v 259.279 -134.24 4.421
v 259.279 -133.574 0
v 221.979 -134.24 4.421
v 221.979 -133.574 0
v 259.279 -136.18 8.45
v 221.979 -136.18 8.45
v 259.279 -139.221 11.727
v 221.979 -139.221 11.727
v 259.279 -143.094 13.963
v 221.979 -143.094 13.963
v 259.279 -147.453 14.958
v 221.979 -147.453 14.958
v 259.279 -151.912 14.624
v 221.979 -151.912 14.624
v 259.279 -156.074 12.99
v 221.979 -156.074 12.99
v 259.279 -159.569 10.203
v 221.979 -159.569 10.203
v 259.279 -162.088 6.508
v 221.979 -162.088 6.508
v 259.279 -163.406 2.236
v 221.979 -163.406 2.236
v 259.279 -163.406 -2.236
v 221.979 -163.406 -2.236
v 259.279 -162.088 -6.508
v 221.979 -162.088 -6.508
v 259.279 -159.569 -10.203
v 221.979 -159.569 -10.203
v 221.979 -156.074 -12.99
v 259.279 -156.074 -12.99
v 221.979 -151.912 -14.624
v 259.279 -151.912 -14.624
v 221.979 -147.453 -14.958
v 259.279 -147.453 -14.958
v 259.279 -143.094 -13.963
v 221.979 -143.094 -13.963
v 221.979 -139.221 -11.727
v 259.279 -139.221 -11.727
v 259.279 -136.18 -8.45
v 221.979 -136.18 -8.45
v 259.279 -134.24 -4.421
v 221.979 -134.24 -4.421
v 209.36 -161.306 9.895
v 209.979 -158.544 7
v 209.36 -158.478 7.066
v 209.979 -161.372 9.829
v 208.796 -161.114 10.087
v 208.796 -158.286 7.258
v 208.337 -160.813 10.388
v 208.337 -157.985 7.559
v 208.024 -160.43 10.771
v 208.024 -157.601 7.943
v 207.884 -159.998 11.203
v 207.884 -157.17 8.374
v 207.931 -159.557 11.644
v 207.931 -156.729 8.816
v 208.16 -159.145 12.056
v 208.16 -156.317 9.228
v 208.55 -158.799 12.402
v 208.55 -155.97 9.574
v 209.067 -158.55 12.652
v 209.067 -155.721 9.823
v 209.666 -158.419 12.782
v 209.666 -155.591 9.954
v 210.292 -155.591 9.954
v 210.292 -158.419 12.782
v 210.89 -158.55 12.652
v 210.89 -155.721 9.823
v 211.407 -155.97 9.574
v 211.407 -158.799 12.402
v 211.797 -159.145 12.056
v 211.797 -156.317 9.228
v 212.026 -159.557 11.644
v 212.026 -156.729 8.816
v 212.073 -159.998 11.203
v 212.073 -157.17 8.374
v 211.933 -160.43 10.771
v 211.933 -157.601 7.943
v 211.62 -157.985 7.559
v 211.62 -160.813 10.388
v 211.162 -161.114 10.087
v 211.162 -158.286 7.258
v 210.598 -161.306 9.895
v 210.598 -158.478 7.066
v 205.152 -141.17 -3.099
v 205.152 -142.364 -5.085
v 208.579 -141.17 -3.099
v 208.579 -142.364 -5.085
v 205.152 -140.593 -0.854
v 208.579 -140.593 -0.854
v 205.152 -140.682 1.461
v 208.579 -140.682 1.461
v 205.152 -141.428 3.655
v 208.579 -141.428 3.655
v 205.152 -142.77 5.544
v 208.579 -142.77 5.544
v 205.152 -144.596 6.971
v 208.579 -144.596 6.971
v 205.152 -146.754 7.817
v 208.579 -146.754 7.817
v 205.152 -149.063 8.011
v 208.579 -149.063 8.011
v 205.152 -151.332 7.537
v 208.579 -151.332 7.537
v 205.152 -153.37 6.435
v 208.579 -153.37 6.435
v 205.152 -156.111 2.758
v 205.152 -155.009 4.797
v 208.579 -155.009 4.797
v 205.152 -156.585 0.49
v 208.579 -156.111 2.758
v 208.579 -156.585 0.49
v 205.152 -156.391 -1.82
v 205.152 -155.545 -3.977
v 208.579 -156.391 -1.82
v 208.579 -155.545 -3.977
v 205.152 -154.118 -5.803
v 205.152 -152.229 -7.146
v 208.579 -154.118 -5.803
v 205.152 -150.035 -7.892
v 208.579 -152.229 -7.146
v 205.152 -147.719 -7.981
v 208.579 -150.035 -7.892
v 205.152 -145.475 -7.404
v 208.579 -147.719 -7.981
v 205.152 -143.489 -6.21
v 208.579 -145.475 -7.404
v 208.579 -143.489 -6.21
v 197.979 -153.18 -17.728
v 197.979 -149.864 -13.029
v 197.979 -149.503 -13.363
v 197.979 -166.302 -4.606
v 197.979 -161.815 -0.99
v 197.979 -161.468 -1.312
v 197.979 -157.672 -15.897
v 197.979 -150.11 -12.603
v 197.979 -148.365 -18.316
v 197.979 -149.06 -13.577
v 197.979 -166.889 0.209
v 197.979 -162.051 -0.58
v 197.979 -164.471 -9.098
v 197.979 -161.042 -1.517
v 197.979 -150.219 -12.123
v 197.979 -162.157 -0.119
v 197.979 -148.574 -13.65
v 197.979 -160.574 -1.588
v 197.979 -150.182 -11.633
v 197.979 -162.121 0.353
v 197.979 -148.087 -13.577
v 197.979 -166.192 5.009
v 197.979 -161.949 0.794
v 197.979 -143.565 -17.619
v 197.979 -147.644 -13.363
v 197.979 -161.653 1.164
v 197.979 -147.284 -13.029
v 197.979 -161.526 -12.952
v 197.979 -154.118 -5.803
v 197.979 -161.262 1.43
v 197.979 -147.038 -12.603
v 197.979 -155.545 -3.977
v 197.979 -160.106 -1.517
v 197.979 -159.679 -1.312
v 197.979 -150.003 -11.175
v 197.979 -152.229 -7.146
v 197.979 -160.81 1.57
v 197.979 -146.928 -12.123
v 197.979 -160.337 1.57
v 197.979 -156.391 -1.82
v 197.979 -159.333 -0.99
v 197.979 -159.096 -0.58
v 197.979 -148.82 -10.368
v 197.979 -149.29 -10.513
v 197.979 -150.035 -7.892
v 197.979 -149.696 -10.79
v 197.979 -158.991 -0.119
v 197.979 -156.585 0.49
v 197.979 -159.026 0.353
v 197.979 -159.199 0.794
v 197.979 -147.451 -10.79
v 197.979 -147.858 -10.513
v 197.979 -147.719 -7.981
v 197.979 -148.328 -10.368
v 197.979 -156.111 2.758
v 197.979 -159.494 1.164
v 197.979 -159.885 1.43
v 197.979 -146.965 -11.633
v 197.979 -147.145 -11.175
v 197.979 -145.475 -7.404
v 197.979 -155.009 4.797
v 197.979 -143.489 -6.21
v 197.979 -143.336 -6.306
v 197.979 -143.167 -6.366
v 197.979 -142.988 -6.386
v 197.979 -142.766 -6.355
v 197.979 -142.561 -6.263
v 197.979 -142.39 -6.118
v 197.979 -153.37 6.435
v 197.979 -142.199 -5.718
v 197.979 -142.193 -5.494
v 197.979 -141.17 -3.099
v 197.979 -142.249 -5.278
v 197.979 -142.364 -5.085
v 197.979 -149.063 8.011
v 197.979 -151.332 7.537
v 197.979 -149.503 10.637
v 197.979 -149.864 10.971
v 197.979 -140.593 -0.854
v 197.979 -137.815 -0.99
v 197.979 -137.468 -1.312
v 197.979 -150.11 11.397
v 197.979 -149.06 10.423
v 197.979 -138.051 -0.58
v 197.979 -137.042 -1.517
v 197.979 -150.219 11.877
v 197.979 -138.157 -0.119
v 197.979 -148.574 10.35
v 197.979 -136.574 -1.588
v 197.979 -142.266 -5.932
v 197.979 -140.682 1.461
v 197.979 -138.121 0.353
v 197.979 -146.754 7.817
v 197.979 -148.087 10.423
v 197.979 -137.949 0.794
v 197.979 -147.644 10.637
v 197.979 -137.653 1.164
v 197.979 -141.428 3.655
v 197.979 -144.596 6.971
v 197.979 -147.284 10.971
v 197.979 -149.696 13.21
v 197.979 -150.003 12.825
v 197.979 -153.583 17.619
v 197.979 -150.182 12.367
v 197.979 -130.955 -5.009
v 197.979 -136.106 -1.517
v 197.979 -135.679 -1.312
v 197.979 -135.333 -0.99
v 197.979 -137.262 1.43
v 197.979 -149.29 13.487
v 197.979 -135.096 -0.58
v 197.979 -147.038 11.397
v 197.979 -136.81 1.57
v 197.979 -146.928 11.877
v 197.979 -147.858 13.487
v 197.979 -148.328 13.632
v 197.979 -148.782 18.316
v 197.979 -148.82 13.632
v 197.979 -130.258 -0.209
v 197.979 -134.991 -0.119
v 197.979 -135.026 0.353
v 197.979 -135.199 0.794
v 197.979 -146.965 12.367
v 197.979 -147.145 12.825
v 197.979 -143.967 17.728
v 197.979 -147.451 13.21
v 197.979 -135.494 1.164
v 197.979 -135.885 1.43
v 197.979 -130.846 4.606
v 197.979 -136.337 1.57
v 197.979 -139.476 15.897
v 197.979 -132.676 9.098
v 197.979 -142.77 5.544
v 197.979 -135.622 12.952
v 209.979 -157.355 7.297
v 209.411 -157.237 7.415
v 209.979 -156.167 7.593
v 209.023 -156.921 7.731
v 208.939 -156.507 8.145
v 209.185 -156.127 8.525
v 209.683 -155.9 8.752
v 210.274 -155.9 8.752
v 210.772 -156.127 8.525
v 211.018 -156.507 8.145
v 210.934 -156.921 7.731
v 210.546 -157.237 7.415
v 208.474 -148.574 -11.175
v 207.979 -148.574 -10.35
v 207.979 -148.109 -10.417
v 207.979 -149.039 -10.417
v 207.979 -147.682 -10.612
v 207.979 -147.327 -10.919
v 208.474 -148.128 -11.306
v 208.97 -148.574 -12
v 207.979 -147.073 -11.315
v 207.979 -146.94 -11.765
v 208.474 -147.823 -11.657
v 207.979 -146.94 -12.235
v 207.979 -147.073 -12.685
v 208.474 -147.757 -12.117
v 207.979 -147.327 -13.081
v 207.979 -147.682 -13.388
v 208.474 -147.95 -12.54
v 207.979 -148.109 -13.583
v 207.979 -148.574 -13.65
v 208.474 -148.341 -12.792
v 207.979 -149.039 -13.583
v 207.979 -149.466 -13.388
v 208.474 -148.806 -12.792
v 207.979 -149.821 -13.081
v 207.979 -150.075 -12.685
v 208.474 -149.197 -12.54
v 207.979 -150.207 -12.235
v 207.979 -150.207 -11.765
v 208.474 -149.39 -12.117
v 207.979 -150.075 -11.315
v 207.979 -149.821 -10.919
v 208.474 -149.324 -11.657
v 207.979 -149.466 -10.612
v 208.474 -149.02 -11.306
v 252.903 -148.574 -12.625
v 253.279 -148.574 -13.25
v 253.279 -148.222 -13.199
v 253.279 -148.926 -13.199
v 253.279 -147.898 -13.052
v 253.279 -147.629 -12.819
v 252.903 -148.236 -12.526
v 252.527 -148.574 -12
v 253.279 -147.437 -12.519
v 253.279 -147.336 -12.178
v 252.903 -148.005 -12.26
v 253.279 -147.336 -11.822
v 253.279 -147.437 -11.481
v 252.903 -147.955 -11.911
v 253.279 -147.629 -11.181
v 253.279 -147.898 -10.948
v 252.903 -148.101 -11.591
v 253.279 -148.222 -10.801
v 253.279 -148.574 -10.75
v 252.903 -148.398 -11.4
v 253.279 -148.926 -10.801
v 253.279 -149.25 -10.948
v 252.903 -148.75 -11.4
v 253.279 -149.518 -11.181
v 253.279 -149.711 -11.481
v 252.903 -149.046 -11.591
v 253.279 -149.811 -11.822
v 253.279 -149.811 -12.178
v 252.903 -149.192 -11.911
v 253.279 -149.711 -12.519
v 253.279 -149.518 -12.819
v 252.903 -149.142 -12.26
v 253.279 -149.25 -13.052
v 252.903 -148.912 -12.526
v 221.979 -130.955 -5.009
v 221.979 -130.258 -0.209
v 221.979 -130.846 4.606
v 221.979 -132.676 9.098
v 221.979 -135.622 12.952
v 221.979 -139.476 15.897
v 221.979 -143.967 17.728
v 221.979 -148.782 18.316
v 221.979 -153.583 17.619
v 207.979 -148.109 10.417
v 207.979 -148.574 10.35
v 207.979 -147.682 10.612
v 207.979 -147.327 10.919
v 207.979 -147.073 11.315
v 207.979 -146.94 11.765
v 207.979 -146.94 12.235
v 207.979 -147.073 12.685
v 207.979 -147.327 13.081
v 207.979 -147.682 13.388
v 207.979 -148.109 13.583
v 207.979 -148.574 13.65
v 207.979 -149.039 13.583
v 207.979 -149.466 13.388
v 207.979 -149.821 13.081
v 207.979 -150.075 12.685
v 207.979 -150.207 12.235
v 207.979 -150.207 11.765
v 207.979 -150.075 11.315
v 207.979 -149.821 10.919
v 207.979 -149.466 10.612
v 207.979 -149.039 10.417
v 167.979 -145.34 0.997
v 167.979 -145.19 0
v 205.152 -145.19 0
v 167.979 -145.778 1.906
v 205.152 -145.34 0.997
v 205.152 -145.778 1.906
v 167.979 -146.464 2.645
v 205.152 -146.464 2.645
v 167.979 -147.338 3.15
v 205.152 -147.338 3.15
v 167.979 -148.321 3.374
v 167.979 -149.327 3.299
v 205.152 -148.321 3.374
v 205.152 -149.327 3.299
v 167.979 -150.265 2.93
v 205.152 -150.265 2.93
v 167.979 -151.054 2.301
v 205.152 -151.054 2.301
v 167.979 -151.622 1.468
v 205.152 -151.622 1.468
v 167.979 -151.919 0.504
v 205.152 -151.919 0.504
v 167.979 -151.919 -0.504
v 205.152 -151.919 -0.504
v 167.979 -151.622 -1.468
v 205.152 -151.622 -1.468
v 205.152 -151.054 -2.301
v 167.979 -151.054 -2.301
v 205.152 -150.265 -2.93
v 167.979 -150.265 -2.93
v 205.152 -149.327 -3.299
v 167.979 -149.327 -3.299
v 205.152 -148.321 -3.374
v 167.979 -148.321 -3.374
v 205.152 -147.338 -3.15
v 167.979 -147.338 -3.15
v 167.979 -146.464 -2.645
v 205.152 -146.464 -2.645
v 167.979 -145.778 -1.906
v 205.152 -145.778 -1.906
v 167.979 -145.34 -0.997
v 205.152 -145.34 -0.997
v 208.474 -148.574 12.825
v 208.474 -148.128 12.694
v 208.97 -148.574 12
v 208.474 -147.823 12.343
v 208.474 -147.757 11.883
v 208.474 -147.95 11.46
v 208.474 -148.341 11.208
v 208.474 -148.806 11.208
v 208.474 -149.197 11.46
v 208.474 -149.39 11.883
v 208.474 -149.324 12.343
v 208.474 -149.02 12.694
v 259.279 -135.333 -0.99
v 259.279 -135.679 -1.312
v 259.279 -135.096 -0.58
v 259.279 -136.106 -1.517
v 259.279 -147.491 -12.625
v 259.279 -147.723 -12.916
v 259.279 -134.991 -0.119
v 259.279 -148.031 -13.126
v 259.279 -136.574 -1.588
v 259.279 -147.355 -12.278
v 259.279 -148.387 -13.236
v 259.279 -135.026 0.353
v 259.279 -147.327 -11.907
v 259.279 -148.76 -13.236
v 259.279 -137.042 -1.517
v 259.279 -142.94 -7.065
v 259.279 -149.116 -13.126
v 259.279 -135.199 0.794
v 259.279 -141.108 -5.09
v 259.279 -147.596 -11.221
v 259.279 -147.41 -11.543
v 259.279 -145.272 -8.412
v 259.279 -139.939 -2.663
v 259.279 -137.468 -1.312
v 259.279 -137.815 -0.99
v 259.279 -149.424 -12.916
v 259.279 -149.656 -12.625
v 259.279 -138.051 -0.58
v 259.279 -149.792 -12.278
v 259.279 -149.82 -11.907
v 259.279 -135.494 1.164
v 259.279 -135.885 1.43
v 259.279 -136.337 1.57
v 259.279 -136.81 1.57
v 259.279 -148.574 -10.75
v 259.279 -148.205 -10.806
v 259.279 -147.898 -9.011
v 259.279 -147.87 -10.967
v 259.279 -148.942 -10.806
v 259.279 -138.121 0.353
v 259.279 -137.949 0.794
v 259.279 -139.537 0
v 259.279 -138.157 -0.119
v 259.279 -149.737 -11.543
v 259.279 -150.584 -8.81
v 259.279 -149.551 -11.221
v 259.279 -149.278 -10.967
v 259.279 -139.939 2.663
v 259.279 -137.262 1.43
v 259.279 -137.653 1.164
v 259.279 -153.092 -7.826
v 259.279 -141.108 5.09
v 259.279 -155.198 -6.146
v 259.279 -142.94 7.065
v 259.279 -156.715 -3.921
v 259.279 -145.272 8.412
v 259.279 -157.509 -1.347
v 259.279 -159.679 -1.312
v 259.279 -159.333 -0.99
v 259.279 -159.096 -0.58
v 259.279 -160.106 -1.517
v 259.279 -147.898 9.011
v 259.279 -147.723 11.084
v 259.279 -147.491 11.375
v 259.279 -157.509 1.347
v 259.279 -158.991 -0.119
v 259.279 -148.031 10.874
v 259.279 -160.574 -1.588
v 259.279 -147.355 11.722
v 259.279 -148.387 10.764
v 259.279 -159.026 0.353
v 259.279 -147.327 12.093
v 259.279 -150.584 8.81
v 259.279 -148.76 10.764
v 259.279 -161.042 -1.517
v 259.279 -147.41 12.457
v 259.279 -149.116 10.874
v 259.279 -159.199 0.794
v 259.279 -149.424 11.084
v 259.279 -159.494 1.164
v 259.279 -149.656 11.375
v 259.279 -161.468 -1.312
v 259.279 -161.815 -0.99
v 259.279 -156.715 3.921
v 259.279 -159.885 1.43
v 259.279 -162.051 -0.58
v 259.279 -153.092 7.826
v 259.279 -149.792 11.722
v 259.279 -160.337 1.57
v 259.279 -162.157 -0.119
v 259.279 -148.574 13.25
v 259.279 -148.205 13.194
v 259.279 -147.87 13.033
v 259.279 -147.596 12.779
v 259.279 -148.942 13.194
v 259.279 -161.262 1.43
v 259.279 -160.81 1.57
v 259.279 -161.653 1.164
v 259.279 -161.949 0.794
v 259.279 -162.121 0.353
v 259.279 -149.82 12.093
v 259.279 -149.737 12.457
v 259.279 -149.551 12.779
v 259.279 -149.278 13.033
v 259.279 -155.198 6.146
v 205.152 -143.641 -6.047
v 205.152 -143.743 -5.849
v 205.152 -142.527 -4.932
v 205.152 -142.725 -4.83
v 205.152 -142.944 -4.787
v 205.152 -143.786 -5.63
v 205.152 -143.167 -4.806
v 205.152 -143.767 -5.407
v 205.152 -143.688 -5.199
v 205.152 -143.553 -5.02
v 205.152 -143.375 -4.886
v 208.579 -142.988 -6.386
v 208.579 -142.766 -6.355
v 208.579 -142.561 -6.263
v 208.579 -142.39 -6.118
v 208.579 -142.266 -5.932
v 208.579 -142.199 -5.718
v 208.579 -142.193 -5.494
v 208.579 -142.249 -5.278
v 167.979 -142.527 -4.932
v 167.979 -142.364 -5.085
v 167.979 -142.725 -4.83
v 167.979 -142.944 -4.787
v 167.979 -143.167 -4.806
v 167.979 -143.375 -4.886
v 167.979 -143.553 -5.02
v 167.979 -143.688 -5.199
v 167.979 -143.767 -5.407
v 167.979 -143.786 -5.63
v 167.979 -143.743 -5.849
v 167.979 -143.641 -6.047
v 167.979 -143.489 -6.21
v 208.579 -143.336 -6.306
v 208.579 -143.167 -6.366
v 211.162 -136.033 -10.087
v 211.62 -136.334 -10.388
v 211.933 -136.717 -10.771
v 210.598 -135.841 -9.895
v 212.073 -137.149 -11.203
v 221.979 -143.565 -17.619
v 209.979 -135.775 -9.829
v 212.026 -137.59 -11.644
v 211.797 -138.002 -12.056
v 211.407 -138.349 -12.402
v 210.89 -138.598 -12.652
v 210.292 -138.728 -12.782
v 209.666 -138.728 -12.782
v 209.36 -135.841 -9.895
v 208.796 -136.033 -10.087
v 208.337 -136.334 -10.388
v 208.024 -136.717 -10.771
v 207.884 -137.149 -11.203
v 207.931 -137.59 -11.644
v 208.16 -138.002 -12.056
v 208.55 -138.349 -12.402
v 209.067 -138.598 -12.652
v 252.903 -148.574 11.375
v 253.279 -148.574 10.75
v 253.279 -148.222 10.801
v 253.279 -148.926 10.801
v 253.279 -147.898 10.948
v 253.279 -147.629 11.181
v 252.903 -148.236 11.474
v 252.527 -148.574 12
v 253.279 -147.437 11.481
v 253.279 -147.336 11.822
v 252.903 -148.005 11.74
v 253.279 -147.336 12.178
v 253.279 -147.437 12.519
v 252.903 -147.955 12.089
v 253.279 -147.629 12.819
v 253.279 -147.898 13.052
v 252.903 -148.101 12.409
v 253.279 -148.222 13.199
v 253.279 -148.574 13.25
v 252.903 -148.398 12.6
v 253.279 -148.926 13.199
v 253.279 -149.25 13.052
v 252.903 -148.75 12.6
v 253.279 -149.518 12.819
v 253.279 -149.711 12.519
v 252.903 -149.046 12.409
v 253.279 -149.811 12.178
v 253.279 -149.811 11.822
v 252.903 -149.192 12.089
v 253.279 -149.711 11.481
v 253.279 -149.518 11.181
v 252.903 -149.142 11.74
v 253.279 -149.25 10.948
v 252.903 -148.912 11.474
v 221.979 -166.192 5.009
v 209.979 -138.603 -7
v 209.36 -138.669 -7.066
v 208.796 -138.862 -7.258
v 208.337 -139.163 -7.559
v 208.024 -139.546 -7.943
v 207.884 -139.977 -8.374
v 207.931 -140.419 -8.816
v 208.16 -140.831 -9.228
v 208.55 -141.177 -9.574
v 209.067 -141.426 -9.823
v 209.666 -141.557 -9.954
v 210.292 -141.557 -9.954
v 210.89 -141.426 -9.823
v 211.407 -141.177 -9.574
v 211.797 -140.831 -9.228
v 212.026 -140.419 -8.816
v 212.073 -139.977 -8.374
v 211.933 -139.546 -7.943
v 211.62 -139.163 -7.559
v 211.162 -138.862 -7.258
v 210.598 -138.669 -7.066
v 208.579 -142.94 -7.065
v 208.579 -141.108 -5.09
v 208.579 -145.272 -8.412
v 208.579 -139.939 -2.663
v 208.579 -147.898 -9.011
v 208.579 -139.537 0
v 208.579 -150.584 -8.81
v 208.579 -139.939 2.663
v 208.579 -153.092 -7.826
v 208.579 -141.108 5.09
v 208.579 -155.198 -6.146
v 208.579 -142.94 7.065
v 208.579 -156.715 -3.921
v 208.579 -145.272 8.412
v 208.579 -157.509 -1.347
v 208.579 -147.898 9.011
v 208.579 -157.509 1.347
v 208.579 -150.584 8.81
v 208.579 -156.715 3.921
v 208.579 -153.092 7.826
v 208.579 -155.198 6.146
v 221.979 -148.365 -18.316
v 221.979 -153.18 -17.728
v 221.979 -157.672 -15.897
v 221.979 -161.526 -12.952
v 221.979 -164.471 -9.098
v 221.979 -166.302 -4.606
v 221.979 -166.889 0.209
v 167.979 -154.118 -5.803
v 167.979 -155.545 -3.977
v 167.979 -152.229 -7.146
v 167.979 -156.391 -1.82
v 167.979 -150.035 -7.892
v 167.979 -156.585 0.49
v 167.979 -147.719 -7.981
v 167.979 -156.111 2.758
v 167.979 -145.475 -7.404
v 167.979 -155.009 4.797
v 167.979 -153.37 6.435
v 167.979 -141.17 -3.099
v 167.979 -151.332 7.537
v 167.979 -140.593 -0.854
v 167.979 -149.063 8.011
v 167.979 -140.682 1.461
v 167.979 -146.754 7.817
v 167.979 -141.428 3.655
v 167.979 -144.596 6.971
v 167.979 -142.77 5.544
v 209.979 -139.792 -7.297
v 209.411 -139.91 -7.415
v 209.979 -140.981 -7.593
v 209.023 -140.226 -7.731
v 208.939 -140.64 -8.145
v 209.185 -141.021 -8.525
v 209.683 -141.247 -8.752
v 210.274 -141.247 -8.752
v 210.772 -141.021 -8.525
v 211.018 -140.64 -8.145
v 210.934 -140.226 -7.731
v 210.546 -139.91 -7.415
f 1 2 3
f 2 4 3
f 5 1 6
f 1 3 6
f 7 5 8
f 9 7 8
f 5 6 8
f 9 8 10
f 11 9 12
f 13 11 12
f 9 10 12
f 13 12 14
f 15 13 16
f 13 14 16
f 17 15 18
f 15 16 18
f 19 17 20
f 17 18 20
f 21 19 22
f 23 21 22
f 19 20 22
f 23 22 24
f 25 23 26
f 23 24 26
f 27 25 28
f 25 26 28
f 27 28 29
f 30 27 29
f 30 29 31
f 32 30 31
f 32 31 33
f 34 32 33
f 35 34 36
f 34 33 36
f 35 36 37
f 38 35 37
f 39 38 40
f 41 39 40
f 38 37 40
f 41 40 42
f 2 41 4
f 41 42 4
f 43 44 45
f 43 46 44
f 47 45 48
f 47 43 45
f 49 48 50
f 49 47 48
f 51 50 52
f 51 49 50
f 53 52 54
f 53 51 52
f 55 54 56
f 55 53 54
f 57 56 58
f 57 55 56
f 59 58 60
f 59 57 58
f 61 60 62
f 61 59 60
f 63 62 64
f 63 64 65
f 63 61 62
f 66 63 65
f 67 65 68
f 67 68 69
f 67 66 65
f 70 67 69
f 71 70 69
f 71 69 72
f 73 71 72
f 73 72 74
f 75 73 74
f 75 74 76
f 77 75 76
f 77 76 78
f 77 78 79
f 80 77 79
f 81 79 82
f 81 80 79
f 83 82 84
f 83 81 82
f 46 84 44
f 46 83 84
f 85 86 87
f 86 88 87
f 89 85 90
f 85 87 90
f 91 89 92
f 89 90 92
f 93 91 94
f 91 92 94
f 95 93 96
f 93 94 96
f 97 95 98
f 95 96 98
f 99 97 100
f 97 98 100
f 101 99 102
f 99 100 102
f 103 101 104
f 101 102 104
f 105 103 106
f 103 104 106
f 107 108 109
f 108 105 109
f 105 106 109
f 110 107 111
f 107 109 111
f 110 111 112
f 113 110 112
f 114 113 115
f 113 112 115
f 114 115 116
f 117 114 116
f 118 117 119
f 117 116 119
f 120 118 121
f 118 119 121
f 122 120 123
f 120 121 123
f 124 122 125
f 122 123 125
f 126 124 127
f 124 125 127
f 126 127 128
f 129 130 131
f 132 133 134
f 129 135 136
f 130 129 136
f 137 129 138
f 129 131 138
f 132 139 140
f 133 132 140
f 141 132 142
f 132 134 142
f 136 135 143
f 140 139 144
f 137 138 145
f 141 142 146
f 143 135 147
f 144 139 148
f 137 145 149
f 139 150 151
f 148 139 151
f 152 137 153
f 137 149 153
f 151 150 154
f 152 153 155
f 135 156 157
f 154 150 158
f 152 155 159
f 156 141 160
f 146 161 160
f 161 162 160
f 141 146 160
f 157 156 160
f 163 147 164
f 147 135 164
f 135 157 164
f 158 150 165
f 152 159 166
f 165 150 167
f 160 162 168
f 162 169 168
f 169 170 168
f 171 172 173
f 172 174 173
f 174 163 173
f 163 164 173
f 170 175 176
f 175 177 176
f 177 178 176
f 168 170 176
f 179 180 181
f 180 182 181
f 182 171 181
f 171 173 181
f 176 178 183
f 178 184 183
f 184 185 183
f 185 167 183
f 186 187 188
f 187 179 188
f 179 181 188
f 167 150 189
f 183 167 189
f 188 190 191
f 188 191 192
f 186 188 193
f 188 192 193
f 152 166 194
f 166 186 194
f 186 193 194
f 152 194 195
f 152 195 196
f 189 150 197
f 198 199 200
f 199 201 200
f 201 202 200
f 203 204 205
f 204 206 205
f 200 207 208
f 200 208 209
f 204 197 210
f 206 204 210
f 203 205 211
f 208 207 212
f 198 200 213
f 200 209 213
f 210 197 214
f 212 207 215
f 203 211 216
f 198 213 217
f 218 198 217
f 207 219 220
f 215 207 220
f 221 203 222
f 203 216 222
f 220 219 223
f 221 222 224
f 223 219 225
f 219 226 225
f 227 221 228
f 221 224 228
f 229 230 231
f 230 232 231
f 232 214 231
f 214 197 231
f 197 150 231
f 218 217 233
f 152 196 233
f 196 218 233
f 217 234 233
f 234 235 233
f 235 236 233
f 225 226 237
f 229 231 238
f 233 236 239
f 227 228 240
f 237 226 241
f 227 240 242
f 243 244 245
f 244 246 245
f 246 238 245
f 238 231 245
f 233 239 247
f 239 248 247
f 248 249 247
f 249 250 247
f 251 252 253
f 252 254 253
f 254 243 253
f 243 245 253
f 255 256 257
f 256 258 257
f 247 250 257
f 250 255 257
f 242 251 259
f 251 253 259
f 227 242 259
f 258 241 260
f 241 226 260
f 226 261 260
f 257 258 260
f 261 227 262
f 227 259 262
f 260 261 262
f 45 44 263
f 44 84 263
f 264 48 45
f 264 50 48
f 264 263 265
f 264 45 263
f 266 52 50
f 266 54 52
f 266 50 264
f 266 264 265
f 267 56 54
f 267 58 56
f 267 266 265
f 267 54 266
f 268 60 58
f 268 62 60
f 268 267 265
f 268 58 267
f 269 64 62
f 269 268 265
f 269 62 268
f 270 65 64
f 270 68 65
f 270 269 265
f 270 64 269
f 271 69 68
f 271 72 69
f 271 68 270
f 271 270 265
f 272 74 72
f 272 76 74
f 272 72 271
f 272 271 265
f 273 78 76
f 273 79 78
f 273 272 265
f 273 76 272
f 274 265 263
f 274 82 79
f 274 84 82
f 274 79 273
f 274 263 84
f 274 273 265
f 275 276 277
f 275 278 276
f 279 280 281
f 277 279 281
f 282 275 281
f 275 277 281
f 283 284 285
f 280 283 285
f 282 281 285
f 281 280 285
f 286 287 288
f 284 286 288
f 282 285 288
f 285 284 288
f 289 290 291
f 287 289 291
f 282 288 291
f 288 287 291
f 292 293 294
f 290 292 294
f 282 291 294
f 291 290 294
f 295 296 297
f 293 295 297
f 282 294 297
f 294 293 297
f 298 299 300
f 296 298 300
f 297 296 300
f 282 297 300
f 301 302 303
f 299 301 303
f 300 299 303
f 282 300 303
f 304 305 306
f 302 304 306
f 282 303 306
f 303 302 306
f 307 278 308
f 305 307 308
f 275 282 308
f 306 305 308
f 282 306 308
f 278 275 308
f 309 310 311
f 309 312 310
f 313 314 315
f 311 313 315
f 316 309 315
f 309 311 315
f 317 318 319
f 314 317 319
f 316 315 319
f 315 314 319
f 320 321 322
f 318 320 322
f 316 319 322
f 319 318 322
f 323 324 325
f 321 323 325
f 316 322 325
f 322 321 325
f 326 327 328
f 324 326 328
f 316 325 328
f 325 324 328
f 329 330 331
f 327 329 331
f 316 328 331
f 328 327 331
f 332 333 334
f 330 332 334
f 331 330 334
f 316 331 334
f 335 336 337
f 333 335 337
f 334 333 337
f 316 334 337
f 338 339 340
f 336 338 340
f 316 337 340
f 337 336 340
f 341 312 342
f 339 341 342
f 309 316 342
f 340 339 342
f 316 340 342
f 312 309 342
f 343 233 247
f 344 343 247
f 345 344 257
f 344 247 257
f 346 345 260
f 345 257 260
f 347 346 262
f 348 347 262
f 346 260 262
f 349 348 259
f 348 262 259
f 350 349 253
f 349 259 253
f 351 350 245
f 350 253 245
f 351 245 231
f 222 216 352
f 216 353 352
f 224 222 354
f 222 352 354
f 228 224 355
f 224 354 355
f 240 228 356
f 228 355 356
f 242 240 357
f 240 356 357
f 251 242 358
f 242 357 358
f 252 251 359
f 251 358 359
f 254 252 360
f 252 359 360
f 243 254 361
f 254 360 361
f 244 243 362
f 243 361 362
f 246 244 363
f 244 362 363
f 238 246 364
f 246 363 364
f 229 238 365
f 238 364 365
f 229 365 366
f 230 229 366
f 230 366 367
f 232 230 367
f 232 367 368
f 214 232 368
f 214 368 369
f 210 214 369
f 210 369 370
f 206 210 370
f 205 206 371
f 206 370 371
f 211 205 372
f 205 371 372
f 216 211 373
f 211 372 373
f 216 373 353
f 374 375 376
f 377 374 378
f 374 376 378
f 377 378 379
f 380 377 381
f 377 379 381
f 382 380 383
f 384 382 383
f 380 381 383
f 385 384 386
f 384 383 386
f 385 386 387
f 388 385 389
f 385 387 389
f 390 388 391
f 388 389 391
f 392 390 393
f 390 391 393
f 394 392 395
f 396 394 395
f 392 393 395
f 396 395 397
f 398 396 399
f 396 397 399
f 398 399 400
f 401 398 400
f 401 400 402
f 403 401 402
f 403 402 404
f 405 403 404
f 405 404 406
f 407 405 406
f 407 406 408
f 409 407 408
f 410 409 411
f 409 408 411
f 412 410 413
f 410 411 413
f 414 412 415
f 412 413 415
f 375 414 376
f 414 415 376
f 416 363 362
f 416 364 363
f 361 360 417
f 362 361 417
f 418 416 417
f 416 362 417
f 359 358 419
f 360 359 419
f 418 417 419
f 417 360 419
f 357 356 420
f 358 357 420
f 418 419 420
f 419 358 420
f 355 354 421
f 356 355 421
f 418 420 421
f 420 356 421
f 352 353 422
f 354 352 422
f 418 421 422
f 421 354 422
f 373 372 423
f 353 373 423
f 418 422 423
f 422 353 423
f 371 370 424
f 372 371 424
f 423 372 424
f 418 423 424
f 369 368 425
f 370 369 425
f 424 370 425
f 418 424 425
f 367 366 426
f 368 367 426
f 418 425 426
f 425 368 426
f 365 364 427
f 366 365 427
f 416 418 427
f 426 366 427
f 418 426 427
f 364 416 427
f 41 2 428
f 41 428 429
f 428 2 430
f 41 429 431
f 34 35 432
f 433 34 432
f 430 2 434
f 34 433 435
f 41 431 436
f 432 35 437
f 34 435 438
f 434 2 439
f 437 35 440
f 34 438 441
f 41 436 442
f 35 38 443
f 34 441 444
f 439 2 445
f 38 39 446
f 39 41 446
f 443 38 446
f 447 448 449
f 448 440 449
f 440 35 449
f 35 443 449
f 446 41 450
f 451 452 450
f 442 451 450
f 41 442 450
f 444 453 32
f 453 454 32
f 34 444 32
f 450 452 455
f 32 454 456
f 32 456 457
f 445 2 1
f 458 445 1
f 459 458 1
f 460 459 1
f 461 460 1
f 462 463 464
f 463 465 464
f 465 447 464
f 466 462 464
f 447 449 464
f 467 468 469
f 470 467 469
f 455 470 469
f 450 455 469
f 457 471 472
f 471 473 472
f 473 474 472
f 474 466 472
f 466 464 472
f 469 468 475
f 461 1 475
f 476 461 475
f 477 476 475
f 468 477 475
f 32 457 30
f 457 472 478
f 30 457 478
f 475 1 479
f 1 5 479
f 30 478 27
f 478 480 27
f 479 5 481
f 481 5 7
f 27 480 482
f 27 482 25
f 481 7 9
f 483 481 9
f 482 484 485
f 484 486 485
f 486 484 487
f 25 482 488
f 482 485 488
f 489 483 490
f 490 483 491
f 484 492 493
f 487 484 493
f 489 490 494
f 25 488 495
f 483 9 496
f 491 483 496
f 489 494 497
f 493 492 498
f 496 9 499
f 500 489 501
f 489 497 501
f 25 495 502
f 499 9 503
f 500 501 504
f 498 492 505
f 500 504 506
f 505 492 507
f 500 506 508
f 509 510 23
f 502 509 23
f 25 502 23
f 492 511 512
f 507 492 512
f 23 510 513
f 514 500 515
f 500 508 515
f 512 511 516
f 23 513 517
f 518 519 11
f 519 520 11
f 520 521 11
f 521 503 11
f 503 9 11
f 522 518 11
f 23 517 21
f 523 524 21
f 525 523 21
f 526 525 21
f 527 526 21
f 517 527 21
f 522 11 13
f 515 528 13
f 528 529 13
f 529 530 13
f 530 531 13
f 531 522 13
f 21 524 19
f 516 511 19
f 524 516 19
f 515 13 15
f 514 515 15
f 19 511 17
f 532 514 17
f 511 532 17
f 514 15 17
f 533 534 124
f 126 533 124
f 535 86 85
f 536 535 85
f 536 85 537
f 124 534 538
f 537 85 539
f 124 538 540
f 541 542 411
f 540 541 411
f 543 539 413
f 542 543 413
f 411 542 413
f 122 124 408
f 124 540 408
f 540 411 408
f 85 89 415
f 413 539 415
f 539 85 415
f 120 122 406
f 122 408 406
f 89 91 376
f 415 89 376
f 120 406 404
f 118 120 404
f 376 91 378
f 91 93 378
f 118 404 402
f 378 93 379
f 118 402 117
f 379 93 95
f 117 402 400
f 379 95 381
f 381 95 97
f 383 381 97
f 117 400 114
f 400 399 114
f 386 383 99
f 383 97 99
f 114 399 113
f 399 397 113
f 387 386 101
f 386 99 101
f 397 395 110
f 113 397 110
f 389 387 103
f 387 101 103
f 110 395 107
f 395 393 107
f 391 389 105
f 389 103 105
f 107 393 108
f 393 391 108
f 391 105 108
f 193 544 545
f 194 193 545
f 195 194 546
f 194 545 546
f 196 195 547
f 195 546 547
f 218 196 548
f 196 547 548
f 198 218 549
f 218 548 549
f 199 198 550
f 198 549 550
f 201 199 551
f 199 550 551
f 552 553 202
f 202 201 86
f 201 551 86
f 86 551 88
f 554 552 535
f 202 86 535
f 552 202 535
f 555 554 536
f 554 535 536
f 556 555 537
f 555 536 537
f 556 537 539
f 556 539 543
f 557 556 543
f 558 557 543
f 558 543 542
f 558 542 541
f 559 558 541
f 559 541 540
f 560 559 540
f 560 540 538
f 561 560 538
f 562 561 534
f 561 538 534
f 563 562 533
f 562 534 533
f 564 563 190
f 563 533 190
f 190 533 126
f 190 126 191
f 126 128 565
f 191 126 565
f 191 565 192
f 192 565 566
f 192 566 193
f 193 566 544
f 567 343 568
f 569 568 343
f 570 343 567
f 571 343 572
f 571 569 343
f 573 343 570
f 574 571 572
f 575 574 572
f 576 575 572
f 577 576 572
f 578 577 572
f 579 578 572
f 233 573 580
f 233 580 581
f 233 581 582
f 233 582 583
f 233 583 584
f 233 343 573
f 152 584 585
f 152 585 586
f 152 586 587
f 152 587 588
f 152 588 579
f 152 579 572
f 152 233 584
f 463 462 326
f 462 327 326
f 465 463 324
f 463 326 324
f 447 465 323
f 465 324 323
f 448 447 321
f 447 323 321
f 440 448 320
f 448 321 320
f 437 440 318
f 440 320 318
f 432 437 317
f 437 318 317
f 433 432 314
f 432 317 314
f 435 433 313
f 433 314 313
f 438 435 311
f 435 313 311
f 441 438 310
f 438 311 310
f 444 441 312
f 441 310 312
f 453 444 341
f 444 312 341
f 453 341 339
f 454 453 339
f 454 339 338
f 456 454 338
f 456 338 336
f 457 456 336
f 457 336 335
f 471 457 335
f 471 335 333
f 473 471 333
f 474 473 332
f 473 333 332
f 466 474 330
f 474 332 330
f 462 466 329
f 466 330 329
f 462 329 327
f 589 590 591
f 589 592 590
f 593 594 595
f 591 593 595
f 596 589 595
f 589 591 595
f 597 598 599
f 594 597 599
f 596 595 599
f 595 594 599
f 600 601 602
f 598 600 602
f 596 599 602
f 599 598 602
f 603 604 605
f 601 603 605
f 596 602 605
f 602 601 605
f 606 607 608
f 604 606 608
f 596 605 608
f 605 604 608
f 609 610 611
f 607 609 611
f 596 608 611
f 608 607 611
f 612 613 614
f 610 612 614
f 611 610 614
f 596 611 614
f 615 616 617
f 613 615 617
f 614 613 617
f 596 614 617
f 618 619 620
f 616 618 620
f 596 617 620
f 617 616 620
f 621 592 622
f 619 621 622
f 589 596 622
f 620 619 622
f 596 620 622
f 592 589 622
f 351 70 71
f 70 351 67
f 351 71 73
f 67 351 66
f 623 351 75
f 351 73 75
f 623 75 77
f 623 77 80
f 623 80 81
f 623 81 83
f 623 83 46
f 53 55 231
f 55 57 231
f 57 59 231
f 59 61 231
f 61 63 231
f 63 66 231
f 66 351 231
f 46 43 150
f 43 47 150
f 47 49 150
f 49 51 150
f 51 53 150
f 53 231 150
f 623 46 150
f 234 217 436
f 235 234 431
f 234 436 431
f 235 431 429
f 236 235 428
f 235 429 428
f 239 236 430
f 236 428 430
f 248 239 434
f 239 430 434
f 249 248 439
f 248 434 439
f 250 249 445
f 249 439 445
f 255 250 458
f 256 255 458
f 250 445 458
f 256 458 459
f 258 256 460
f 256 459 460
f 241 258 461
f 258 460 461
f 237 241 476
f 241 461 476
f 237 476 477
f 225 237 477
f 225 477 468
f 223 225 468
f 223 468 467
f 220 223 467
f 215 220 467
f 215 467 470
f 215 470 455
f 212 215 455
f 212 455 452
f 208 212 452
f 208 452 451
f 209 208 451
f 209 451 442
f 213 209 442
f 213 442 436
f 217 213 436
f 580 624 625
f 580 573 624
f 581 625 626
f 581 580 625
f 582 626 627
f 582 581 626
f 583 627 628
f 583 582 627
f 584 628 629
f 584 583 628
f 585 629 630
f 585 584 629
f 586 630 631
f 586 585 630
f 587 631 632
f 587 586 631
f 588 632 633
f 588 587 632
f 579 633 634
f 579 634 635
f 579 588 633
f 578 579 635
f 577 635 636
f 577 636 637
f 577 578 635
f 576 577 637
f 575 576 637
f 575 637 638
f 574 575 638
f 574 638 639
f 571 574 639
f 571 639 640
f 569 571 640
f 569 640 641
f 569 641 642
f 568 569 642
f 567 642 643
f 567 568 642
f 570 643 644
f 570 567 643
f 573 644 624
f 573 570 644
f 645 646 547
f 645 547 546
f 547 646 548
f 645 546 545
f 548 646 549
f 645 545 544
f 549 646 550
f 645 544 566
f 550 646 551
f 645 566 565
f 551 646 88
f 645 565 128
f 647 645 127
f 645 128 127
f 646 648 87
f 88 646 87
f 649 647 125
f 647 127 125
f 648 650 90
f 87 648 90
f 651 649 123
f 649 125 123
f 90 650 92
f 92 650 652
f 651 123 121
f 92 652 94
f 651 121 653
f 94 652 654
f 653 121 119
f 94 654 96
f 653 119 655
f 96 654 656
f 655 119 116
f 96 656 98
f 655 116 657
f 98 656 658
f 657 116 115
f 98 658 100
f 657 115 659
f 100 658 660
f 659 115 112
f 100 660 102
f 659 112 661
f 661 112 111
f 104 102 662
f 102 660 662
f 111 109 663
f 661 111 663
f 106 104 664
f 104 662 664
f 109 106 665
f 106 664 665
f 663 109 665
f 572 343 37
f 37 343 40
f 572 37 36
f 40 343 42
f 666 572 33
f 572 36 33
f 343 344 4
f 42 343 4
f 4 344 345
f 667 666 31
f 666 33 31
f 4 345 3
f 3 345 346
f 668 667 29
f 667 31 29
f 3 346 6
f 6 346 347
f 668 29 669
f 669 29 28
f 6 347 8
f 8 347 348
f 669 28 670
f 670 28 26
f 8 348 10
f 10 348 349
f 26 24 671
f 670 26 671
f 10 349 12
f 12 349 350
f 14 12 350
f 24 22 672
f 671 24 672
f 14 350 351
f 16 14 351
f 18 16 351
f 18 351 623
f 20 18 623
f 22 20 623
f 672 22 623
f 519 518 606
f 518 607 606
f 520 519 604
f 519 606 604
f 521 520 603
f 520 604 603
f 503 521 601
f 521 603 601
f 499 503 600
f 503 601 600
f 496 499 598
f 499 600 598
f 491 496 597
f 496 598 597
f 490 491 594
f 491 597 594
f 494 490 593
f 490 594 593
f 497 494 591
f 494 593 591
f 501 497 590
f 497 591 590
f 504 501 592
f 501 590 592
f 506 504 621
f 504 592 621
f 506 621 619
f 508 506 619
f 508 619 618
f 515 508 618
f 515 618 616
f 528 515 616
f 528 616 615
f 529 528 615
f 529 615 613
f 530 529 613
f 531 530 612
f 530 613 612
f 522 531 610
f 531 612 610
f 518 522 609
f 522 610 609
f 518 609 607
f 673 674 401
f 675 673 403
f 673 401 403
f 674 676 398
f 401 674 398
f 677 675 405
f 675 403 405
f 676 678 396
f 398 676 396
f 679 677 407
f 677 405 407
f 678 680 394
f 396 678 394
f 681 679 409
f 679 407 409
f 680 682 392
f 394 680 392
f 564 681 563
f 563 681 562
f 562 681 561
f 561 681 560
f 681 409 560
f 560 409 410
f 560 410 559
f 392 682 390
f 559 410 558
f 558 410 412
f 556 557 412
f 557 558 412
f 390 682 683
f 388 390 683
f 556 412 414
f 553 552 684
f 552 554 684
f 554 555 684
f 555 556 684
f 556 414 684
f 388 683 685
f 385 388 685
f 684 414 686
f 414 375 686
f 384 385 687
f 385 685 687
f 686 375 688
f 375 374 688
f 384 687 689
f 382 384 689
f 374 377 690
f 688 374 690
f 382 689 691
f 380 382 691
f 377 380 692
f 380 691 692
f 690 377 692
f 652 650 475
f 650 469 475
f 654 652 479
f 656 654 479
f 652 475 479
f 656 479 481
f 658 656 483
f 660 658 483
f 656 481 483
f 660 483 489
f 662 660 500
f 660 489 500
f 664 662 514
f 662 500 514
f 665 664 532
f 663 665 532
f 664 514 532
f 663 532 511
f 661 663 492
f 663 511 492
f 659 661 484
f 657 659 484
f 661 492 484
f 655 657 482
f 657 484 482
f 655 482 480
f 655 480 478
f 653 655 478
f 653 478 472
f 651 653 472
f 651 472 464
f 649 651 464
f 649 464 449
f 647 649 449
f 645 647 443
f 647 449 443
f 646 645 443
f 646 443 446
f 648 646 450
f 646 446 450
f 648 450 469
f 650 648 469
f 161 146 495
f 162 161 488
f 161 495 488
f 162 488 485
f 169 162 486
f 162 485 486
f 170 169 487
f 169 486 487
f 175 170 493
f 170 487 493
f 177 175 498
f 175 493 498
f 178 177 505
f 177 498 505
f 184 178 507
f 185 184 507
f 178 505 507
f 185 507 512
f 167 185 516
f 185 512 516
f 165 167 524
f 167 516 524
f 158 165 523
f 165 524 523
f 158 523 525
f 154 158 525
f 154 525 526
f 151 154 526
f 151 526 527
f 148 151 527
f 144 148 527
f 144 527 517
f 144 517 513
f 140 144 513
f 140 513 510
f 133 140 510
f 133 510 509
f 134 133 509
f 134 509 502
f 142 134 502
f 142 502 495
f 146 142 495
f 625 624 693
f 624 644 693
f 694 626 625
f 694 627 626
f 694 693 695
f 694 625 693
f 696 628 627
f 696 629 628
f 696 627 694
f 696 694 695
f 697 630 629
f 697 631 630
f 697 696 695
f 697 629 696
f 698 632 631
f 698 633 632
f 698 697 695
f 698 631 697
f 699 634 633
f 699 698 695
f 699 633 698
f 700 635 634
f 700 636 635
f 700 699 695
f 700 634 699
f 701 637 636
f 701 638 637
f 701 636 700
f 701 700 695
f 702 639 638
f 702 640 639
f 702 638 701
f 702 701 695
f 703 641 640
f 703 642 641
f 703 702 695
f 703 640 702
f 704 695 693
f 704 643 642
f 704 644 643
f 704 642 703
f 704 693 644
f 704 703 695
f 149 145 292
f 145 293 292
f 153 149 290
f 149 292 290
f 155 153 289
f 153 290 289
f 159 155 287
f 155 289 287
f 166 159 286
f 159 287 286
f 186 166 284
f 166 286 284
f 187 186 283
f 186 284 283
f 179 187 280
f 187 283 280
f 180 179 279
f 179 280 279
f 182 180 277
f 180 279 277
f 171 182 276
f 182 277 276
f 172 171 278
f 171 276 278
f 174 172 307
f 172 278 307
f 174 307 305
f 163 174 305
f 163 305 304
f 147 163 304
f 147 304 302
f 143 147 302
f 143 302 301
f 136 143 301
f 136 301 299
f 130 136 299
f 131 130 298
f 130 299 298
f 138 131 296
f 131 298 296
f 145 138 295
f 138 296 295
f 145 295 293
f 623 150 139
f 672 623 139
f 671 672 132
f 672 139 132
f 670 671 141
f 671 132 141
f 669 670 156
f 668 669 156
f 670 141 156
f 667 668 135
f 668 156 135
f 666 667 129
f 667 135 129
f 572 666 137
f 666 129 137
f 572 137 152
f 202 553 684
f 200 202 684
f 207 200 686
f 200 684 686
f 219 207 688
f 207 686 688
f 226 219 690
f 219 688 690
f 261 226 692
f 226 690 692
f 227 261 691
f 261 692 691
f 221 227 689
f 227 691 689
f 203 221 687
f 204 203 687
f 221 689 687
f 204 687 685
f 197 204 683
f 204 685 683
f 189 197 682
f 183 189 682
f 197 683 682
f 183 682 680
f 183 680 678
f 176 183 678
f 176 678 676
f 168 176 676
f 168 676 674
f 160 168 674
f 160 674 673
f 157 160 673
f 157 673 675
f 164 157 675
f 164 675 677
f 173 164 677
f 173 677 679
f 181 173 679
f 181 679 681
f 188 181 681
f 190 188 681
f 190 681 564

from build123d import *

# Parameters (mm, degrees)
CUT_EXTRUDE1_REACH          = 93.3
SKETCH8_R                   = 1.5875
TAP_DRILL_FOR_M3_TAP2_D     = 2.5
TAP_DRILL_FOR_M3_TAP2_DEPTH = 6
TAP_DRILL_FOR_M3_TAP2_TIP   = 0.751075774
TAP_DRILL_FOR_M4_TAP1_D     = 3.3
TAP_DRILL_FOR_M4_TAP1_DEPTH = 10
TAP_DRILL_FOR_M4_TAP1_TIP   = 0.991420021
CUT_EXTRUDE2_DEPTH          = 30
CIRPATTERN1_COUNT           = 2
CUT_EXTRUDE3_REACH          = 42.6
SKETCH19_R                  = 0.8


with BuildPart() as part:
    # Sketch3 → Revolve1 (revolve)
    with BuildSketch(Plane.XY):
        Polygon((208.579017697, -139.537446021), (250.685153788, -139.537446021), (259.278559985, -139.537446021), (259.278559985, -133.573704322), (238.427343436, -133.573704322), (221.978559985, -133.573704322), (221.978559985, -130.256968654), (197.978559985, -130.256968654), (197.978559985, -140.547506676), (167.978559985, -140.547506676), (167.978559985, -145.190124478), (205.151545348, -145.190124478), (205.151545348, -140.547506676), (208.579017697, -140.547506676), align=None)
    revolve(axis=Axis((227.370475166, -148.573704322, 0), (1, 0, 0)))

    # Sketch8 → Cut-Extrude1 (cut, up to next)
    with BuildSketch(Plane(origin=(259.278559985, 0, 0), x_dir=(0, 0, -1), z_dir=(1, 0, 0)), mode=Mode.PRIVATE) as cut_extrude1_sk1:
        with Locations((0, -136.573704322)):
            Circle(SKETCH8_R)
    cut_extrude1_tool1 = extrude(cut_extrude1_sk1.sketch, amount=-CUT_EXTRUDE1_REACH, mode=Mode.PRIVATE) & part.part
    add(cut_extrude1_tool1.solids().sort_by_distance((259.27856, -136.573704, 0))[0], mode=Mode.SUBTRACT)
    # Sketch8 → Cut-Extrude1 (cut, up to next)
    with BuildSketch(Plane(origin=(259.278559985, 0, 0), x_dir=(0, 0, -1), z_dir=(1, 0, 0)), mode=Mode.PRIVATE) as cut_extrude1_sk2:
        with Locations((0, -160.573704322)):
            Circle(SKETCH8_R)
    cut_extrude1_tool2 = extrude(cut_extrude1_sk2.sketch, amount=-CUT_EXTRUDE1_REACH, mode=Mode.PRIVATE) & part.part
    add(cut_extrude1_tool2.solids().sort_by_distance((259.27856, -160.573704, 0))[0], mode=Mode.SUBTRACT)

    # Tap Drill for M3 Tap2
    with Locations(Plane(origin=(259.278559985, 0, 0), x_dir=(0, 0, -1), z_dir=(1, 0, 0))):
        with Locations((-12, -148.573704322), (12, -148.573704322)):
            Hole(TAP_DRILL_FOR_M3_TAP2_D / 2, depth=TAP_DRILL_FOR_M3_TAP2_DEPTH)
            with Locations((0, 0, -(TAP_DRILL_FOR_M3_TAP2_DEPTH + TAP_DRILL_FOR_M3_TAP2_TIP / 2))):  # 118° drill point
                Cone(0, TAP_DRILL_FOR_M3_TAP2_D / 2, TAP_DRILL_FOR_M3_TAP2_TIP, mode=Mode.SUBTRACT)

    # Tap Drill for M4 Tap1
    with Locations(Plane.ZY.offset(-197.978559985)):
        with Locations((-12, -148.573704322), (12, -148.573704322)):
            Hole(TAP_DRILL_FOR_M4_TAP1_D / 2, depth=TAP_DRILL_FOR_M4_TAP1_DEPTH)
            with Locations((0, 0, -(TAP_DRILL_FOR_M4_TAP1_DEPTH + TAP_DRILL_FOR_M4_TAP1_TIP / 2))):  # 118° drill point
                Cone(0, TAP_DRILL_FOR_M4_TAP1_D / 2, TAP_DRILL_FOR_M4_TAP1_TIP, mode=Mode.SUBTRACT)

    # Sketch16 → Cut-Extrude2 (cut)
    with BuildSketch(Plane.ZY.offset(-197.978559985)):
        Polygon((-1.637133312, -127.583420636), (-21.615778458, -147.562065782), (-21.615778458, -136.774049127), align=None)
        Polygon((24.069809273, -155.63537923), (24.069809273, -147.131312047), (1.983531933, -169.217589388), align=None)
    extrude(amount=-CUT_EXTRUDE2_DEPTH, mode=Mode.SUBTRACT)

    # Sketch18 → Tap Drill for M5 Tap1 (revolve, cut)
    with BuildSketch(Plane(origin=(209.978559985, -137.259995823, -11.313708499), x_dir=(0, 0.707106781, 0.707106781), z_dir=(1, 0, 0))):
        Polygon((0, 0), (0, 5.2618073), (2.1, 4), (2.1, 0), align=None)
    tap_drill_for_m5_tap1 = revolve(axis=Axis((209.978559985, -132.769867763, -15.80383656), (0, -0.707106781, 0.707106781)), mode=Mode.SUBTRACT)

    # CirPattern1: Tap Drill for M5 Tap1 ×2 about axis
    cirpattern1_axis = Axis((205.151545348, -148.573704322, 0), (-1, 0, 0))
    for i in range(1, CIRPATTERN1_COUNT):
        add(tap_drill_for_m5_tap1.rotate(cirpattern1_axis, i * 360 / CIRPATTERN1_COUNT), mode=Mode.SUBTRACT)

    # Sketch19 → Cut-Extrude3 (cut, up to next)
    with BuildSketch(Plane(origin=(208.579017697, 0, 0), x_dir=(0, 0, -1), z_dir=(1, 0, 0)), mode=Mode.PRIVATE) as cut_extrude3_sk1:
        with Locations((5.586143571, -142.987560751)):
            Circle(SKETCH19_R)
    cut_extrude3_tool1 = extrude(cut_extrude3_sk1.sketch, amount=-CUT_EXTRUDE3_REACH, mode=Mode.PRIVATE) & part.part
    add(cut_extrude3_tool1.solids().sort_by_distance((208.579018, -142.987561, -5.586144))[0], mode=Mode.SUBTRACT)


solid = part.part
